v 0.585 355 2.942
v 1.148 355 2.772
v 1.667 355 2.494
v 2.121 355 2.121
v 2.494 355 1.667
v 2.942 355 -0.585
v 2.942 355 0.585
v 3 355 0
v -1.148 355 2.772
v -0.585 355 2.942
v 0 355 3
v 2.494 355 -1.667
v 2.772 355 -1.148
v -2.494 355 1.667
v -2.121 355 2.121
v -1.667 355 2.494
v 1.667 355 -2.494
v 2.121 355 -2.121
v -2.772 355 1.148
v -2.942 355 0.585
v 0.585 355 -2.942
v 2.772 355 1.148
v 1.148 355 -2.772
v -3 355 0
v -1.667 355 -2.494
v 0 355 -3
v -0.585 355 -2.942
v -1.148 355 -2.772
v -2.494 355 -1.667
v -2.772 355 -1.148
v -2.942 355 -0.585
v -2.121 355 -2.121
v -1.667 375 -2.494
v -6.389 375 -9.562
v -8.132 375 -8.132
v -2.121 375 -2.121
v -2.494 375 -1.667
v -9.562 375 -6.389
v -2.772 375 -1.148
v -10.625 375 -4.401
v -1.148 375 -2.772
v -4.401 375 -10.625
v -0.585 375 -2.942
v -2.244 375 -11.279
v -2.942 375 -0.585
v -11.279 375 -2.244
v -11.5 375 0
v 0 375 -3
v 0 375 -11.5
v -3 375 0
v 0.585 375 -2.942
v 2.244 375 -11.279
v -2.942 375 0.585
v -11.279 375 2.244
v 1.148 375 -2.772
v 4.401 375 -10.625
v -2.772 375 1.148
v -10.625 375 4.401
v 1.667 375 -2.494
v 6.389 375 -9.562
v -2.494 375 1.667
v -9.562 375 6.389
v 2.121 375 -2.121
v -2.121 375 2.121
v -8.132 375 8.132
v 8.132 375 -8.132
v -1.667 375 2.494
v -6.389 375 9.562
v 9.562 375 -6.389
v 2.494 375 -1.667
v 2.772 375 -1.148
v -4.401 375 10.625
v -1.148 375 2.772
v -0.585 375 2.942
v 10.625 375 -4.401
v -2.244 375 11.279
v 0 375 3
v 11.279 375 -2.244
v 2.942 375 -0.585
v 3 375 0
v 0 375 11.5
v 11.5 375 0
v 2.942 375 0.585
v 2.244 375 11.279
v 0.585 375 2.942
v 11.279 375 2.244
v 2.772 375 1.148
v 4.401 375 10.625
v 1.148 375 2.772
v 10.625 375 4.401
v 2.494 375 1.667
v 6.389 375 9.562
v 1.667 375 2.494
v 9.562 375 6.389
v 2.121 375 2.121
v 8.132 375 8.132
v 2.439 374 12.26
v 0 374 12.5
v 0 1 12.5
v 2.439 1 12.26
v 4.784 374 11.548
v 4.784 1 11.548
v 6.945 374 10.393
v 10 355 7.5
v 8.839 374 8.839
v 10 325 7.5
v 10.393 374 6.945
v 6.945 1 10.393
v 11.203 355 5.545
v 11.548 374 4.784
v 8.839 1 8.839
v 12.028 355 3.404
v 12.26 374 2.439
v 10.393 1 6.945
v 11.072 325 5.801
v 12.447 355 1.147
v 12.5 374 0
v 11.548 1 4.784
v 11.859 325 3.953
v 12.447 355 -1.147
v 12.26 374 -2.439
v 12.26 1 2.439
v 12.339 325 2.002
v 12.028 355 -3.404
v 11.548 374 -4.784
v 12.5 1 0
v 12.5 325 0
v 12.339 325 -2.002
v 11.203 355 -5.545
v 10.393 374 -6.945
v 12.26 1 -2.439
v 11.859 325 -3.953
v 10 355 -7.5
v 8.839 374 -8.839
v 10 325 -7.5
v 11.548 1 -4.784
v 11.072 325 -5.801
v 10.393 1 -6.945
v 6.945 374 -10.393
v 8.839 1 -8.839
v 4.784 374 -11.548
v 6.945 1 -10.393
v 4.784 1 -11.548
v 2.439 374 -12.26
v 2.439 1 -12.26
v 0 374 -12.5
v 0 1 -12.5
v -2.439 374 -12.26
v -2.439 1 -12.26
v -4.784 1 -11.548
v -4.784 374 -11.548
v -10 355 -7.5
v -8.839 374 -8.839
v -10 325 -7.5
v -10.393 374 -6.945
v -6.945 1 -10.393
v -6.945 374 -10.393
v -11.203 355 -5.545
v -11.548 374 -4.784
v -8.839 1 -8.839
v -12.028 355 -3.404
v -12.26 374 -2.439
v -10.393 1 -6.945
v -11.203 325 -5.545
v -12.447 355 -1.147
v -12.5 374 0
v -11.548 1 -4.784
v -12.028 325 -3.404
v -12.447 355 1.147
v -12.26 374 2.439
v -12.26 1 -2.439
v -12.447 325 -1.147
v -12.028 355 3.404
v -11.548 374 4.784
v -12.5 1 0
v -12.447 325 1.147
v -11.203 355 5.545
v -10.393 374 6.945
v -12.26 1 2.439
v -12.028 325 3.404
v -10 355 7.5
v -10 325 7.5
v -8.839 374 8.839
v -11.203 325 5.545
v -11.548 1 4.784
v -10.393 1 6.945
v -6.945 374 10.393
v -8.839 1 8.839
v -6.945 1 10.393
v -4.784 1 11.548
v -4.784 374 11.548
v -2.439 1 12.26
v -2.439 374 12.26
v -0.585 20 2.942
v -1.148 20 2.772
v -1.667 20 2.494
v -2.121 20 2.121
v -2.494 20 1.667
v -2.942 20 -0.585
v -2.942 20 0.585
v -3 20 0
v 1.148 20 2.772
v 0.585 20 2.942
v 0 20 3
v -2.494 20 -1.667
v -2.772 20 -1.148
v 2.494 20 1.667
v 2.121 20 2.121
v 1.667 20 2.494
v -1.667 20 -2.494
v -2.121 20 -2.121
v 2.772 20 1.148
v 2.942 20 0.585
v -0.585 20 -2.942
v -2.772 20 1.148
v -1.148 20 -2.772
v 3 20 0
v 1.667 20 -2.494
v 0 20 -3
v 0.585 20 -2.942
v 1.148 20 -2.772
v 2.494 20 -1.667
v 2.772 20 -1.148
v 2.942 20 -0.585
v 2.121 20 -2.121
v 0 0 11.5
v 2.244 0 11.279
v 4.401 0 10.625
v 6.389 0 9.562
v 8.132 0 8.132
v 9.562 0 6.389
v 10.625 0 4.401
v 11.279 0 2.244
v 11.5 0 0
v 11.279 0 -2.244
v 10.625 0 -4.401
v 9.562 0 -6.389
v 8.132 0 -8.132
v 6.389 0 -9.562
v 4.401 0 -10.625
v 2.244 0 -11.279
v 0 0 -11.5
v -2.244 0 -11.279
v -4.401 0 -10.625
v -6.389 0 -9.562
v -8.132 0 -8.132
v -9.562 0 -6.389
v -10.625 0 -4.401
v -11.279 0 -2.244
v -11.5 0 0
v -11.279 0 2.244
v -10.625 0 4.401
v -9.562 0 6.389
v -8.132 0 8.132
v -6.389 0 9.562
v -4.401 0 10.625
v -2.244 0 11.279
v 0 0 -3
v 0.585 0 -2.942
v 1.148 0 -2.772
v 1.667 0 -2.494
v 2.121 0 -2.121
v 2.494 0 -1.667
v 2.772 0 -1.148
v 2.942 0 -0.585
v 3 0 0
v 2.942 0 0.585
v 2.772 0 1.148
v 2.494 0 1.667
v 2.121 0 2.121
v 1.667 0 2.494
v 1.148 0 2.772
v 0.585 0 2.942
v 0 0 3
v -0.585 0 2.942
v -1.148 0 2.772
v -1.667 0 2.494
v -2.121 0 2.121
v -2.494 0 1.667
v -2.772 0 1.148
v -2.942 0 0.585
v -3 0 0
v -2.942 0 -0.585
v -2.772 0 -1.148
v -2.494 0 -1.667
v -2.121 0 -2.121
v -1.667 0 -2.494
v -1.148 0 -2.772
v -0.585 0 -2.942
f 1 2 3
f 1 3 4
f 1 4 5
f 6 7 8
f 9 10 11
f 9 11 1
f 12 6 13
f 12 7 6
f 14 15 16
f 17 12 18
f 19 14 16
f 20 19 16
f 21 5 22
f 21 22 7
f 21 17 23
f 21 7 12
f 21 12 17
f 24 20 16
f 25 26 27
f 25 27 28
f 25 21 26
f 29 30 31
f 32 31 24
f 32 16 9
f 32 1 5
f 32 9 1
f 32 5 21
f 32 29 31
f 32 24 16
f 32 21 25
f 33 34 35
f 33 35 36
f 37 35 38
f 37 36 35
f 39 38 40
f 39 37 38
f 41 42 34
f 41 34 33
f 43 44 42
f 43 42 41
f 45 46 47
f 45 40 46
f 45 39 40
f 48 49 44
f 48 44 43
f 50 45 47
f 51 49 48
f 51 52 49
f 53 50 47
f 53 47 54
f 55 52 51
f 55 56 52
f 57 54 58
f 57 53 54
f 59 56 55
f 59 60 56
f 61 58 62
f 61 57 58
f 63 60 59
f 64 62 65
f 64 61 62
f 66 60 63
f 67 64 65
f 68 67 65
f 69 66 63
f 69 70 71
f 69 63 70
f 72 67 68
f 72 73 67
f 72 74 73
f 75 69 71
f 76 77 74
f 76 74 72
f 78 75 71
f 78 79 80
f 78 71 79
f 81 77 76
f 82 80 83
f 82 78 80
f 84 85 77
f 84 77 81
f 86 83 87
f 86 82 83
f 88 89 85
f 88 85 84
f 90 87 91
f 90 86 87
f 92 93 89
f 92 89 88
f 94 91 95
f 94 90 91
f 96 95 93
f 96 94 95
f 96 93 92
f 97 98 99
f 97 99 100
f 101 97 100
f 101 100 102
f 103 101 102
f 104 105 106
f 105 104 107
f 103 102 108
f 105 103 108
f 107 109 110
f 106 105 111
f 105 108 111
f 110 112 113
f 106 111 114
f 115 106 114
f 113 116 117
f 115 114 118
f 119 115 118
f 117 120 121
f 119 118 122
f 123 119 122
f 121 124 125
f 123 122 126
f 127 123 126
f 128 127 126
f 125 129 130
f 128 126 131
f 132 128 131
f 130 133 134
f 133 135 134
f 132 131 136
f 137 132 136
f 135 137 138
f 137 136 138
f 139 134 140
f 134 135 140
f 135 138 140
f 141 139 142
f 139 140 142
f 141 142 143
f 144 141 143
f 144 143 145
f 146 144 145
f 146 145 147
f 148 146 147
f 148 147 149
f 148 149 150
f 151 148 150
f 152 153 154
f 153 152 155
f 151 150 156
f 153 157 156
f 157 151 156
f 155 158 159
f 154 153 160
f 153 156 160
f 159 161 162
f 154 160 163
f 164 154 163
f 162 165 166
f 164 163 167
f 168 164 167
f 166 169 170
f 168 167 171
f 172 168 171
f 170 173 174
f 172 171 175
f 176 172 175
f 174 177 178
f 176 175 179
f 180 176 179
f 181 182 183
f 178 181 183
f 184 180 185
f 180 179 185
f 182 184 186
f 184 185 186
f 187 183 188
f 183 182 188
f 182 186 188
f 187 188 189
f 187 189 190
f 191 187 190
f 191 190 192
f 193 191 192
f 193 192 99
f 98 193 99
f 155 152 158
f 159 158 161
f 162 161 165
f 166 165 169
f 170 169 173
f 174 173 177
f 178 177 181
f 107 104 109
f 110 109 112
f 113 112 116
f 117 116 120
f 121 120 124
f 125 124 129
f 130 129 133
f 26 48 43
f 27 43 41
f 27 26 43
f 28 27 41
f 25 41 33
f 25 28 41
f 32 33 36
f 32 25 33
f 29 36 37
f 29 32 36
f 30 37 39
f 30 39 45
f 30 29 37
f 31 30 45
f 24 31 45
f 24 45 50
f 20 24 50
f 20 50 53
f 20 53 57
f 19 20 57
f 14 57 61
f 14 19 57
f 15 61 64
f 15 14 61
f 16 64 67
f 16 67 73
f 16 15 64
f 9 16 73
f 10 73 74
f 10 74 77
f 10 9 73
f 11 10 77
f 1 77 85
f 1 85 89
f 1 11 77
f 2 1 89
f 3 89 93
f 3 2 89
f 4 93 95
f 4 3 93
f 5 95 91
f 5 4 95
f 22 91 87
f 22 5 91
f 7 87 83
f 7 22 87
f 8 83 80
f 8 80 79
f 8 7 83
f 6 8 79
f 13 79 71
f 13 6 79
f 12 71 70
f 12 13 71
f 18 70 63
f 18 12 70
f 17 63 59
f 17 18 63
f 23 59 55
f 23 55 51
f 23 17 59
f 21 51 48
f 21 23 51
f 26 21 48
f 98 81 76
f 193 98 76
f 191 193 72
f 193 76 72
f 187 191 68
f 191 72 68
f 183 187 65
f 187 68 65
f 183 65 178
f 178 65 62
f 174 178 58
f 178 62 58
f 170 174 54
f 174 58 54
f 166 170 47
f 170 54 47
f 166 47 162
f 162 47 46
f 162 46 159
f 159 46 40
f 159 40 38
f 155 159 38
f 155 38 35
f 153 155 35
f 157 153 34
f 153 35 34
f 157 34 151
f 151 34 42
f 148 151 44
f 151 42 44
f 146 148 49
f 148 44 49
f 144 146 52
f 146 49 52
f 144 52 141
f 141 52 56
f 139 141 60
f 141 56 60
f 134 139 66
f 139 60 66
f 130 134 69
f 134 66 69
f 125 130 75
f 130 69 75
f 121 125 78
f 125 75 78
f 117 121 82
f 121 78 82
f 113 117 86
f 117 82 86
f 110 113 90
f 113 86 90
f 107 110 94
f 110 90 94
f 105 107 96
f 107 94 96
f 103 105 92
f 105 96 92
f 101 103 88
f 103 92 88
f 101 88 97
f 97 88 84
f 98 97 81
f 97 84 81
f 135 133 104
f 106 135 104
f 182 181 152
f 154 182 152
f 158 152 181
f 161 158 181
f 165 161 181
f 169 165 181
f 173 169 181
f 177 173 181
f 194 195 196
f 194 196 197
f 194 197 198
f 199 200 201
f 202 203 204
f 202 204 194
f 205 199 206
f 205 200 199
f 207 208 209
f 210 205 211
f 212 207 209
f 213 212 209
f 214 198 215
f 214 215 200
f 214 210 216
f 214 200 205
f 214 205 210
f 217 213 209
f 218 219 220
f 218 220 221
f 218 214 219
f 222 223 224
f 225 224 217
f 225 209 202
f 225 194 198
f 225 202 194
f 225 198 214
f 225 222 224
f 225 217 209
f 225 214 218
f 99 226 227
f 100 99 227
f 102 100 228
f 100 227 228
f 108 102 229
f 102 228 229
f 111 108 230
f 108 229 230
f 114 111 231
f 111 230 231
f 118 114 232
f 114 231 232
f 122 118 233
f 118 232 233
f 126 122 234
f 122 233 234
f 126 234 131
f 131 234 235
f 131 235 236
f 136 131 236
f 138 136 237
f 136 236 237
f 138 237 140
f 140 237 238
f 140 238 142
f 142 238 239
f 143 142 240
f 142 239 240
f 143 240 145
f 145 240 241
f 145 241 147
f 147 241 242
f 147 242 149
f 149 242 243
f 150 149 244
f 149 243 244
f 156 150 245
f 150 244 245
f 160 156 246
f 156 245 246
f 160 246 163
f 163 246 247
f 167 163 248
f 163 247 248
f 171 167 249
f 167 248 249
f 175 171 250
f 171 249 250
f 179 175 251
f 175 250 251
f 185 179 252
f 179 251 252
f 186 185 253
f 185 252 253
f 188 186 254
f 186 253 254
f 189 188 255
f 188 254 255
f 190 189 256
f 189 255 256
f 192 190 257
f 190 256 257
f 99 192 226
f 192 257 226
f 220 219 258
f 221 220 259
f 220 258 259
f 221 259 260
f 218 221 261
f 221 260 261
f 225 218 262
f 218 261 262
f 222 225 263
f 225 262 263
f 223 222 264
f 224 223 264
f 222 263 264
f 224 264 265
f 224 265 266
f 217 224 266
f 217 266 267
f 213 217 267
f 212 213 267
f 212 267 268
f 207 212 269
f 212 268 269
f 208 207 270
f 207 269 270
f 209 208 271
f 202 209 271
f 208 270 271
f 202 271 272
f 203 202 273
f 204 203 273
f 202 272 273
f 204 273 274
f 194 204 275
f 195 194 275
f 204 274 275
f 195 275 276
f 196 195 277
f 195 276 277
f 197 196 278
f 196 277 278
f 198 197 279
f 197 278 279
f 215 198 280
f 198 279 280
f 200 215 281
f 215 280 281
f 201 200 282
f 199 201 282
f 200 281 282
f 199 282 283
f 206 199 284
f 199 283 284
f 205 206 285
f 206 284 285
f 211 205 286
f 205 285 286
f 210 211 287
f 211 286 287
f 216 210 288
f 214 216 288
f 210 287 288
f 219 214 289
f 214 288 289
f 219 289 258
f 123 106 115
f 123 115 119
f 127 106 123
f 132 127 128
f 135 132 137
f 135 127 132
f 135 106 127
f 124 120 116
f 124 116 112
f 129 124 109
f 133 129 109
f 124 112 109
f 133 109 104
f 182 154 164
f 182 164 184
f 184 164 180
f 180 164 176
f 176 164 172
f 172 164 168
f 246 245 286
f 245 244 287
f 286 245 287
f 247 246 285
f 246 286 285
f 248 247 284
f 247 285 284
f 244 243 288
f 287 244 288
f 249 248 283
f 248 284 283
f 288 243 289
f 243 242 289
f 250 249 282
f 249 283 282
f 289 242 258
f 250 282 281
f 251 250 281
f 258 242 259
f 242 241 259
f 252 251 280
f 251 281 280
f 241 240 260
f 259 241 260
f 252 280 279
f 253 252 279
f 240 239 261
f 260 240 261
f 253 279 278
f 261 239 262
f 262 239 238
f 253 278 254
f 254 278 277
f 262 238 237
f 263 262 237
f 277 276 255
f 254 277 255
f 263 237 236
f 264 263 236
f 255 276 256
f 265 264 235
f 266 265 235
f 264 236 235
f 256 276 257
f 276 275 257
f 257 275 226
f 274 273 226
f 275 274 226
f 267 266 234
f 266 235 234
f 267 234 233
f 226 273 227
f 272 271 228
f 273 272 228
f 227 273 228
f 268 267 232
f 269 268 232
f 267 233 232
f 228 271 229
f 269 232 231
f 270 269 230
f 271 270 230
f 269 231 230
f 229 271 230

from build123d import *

# Parameters (mm, degrees)
SKETCH_2_R          = 12.5
EXTRUDE_3_DEPTH     = 375
SKETCH_5_R          = 3
CUT_EXTRUDE_2_DEPTH = 20
CUT_EXTRUDE_START   = -50
CUT_EXTRUDE_3_DEPTH = 50
EXTRUDE_START       = -20
SKETCH_11_R         = 12.5
EXTRUDE_5_DEPTH     = 20
CUT_EXTRUDE_START_2 = -20
SKETCH_12_R         = 3
CUT_EXTRUDE_4_DEPTH = 20
CHAMFER_1_SIZE      = 1
CHAMFER_2_SIZE      = 1


with BuildPart() as part:
    # 草图2 → 凸台-拉伸3 (new body)
    with BuildSketch(Plane(origin=(0, 0, 0), x_dir=(1, 0, 0), z_dir=(0, 1, 0))):
        with Locations(Location((0, 0, 0), (0, 0, 270))):
            Circle(SKETCH_2_R)
    extrude(amount=EXTRUDE_3_DEPTH)

    # 草图5 → 切除-拉伸2 (cut)
    with BuildSketch(Plane.XZ):
        with Locations(Location((0, 0, 0), (0, 0, 270))):
            Circle(SKETCH_5_R)
    extrude(amount=-CUT_EXTRUDE_2_DEPTH, mode=Mode.SUBTRACT)

    # 草图7 → 切除-拉伸3 (cut)
    with BuildSketch(Plane(origin=(0, 375, 0), x_dir=(1, 0, 0), z_dir=(0, 1, 0)).offset(CUT_EXTRUDE_START)):
        with BuildLine():
            Line((10, 7.5), (10, 0))
            Line((10, 0), (10, -7.5))
            ThreePointArc((10, -7.5), (11.858541226, -3.952847075), (12.5, 0))
            ThreePointArc((12.5, 0), (11.858541226, 3.952847075), (10, 7.5))
        make_face()
        with BuildLine():
            Line((-10, 0), (-10, 7.5))
            ThreePointArc((-10, 7.5), (-12.5, 0), (-10, -7.5))
            Line((-10, -7.5), (-10, 0))
        make_face()
    extrude(amount=CUT_EXTRUDE_3_DEPTH, mode=Mode.SUBTRACT)

    # 草图11 → 凸台-拉伸5 (add)
    with BuildSketch(Plane(origin=(0, 375, 0), x_dir=(1, 0, 0), z_dir=(0, 1, 0)).offset(EXTRUDE_START)):
        with Locations(Location((0, 0, 0), (0, 0, 270))):
            Circle(SKETCH_11_R)
    extrude(amount=EXTRUDE_5_DEPTH)

    # 草图12 → 切除-拉伸4 (cut)
    with BuildSketch(Plane(origin=(0, 375, 0), x_dir=(1, 0, 0), z_dir=(0, 1, 0)).offset(CUT_EXTRUDE_START_2)):
        with Locations(Location((0, 0, 0), (0, 0, 90))):
            Circle(SKETCH_12_R)
    extrude(amount=CUT_EXTRUDE_4_DEPTH, mode=Mode.SUBTRACT)

    # 倒角1
    chamfer_1_edges = [part.edges().sort_by_distance(p)[0] for p in [
        (0, 0, -12.5),
    ]]
    chamfer(chamfer_1_edges, length=CHAMFER_1_SIZE)

    # 倒角2
    chamfer_2_edges = [part.edges().sort_by_distance(p)[0] for p in [
        (0, 375, -12.5),
    ]]
    chamfer(chamfer_2_edges, length=CHAMFER_2_SIZE)


solid = part.part
